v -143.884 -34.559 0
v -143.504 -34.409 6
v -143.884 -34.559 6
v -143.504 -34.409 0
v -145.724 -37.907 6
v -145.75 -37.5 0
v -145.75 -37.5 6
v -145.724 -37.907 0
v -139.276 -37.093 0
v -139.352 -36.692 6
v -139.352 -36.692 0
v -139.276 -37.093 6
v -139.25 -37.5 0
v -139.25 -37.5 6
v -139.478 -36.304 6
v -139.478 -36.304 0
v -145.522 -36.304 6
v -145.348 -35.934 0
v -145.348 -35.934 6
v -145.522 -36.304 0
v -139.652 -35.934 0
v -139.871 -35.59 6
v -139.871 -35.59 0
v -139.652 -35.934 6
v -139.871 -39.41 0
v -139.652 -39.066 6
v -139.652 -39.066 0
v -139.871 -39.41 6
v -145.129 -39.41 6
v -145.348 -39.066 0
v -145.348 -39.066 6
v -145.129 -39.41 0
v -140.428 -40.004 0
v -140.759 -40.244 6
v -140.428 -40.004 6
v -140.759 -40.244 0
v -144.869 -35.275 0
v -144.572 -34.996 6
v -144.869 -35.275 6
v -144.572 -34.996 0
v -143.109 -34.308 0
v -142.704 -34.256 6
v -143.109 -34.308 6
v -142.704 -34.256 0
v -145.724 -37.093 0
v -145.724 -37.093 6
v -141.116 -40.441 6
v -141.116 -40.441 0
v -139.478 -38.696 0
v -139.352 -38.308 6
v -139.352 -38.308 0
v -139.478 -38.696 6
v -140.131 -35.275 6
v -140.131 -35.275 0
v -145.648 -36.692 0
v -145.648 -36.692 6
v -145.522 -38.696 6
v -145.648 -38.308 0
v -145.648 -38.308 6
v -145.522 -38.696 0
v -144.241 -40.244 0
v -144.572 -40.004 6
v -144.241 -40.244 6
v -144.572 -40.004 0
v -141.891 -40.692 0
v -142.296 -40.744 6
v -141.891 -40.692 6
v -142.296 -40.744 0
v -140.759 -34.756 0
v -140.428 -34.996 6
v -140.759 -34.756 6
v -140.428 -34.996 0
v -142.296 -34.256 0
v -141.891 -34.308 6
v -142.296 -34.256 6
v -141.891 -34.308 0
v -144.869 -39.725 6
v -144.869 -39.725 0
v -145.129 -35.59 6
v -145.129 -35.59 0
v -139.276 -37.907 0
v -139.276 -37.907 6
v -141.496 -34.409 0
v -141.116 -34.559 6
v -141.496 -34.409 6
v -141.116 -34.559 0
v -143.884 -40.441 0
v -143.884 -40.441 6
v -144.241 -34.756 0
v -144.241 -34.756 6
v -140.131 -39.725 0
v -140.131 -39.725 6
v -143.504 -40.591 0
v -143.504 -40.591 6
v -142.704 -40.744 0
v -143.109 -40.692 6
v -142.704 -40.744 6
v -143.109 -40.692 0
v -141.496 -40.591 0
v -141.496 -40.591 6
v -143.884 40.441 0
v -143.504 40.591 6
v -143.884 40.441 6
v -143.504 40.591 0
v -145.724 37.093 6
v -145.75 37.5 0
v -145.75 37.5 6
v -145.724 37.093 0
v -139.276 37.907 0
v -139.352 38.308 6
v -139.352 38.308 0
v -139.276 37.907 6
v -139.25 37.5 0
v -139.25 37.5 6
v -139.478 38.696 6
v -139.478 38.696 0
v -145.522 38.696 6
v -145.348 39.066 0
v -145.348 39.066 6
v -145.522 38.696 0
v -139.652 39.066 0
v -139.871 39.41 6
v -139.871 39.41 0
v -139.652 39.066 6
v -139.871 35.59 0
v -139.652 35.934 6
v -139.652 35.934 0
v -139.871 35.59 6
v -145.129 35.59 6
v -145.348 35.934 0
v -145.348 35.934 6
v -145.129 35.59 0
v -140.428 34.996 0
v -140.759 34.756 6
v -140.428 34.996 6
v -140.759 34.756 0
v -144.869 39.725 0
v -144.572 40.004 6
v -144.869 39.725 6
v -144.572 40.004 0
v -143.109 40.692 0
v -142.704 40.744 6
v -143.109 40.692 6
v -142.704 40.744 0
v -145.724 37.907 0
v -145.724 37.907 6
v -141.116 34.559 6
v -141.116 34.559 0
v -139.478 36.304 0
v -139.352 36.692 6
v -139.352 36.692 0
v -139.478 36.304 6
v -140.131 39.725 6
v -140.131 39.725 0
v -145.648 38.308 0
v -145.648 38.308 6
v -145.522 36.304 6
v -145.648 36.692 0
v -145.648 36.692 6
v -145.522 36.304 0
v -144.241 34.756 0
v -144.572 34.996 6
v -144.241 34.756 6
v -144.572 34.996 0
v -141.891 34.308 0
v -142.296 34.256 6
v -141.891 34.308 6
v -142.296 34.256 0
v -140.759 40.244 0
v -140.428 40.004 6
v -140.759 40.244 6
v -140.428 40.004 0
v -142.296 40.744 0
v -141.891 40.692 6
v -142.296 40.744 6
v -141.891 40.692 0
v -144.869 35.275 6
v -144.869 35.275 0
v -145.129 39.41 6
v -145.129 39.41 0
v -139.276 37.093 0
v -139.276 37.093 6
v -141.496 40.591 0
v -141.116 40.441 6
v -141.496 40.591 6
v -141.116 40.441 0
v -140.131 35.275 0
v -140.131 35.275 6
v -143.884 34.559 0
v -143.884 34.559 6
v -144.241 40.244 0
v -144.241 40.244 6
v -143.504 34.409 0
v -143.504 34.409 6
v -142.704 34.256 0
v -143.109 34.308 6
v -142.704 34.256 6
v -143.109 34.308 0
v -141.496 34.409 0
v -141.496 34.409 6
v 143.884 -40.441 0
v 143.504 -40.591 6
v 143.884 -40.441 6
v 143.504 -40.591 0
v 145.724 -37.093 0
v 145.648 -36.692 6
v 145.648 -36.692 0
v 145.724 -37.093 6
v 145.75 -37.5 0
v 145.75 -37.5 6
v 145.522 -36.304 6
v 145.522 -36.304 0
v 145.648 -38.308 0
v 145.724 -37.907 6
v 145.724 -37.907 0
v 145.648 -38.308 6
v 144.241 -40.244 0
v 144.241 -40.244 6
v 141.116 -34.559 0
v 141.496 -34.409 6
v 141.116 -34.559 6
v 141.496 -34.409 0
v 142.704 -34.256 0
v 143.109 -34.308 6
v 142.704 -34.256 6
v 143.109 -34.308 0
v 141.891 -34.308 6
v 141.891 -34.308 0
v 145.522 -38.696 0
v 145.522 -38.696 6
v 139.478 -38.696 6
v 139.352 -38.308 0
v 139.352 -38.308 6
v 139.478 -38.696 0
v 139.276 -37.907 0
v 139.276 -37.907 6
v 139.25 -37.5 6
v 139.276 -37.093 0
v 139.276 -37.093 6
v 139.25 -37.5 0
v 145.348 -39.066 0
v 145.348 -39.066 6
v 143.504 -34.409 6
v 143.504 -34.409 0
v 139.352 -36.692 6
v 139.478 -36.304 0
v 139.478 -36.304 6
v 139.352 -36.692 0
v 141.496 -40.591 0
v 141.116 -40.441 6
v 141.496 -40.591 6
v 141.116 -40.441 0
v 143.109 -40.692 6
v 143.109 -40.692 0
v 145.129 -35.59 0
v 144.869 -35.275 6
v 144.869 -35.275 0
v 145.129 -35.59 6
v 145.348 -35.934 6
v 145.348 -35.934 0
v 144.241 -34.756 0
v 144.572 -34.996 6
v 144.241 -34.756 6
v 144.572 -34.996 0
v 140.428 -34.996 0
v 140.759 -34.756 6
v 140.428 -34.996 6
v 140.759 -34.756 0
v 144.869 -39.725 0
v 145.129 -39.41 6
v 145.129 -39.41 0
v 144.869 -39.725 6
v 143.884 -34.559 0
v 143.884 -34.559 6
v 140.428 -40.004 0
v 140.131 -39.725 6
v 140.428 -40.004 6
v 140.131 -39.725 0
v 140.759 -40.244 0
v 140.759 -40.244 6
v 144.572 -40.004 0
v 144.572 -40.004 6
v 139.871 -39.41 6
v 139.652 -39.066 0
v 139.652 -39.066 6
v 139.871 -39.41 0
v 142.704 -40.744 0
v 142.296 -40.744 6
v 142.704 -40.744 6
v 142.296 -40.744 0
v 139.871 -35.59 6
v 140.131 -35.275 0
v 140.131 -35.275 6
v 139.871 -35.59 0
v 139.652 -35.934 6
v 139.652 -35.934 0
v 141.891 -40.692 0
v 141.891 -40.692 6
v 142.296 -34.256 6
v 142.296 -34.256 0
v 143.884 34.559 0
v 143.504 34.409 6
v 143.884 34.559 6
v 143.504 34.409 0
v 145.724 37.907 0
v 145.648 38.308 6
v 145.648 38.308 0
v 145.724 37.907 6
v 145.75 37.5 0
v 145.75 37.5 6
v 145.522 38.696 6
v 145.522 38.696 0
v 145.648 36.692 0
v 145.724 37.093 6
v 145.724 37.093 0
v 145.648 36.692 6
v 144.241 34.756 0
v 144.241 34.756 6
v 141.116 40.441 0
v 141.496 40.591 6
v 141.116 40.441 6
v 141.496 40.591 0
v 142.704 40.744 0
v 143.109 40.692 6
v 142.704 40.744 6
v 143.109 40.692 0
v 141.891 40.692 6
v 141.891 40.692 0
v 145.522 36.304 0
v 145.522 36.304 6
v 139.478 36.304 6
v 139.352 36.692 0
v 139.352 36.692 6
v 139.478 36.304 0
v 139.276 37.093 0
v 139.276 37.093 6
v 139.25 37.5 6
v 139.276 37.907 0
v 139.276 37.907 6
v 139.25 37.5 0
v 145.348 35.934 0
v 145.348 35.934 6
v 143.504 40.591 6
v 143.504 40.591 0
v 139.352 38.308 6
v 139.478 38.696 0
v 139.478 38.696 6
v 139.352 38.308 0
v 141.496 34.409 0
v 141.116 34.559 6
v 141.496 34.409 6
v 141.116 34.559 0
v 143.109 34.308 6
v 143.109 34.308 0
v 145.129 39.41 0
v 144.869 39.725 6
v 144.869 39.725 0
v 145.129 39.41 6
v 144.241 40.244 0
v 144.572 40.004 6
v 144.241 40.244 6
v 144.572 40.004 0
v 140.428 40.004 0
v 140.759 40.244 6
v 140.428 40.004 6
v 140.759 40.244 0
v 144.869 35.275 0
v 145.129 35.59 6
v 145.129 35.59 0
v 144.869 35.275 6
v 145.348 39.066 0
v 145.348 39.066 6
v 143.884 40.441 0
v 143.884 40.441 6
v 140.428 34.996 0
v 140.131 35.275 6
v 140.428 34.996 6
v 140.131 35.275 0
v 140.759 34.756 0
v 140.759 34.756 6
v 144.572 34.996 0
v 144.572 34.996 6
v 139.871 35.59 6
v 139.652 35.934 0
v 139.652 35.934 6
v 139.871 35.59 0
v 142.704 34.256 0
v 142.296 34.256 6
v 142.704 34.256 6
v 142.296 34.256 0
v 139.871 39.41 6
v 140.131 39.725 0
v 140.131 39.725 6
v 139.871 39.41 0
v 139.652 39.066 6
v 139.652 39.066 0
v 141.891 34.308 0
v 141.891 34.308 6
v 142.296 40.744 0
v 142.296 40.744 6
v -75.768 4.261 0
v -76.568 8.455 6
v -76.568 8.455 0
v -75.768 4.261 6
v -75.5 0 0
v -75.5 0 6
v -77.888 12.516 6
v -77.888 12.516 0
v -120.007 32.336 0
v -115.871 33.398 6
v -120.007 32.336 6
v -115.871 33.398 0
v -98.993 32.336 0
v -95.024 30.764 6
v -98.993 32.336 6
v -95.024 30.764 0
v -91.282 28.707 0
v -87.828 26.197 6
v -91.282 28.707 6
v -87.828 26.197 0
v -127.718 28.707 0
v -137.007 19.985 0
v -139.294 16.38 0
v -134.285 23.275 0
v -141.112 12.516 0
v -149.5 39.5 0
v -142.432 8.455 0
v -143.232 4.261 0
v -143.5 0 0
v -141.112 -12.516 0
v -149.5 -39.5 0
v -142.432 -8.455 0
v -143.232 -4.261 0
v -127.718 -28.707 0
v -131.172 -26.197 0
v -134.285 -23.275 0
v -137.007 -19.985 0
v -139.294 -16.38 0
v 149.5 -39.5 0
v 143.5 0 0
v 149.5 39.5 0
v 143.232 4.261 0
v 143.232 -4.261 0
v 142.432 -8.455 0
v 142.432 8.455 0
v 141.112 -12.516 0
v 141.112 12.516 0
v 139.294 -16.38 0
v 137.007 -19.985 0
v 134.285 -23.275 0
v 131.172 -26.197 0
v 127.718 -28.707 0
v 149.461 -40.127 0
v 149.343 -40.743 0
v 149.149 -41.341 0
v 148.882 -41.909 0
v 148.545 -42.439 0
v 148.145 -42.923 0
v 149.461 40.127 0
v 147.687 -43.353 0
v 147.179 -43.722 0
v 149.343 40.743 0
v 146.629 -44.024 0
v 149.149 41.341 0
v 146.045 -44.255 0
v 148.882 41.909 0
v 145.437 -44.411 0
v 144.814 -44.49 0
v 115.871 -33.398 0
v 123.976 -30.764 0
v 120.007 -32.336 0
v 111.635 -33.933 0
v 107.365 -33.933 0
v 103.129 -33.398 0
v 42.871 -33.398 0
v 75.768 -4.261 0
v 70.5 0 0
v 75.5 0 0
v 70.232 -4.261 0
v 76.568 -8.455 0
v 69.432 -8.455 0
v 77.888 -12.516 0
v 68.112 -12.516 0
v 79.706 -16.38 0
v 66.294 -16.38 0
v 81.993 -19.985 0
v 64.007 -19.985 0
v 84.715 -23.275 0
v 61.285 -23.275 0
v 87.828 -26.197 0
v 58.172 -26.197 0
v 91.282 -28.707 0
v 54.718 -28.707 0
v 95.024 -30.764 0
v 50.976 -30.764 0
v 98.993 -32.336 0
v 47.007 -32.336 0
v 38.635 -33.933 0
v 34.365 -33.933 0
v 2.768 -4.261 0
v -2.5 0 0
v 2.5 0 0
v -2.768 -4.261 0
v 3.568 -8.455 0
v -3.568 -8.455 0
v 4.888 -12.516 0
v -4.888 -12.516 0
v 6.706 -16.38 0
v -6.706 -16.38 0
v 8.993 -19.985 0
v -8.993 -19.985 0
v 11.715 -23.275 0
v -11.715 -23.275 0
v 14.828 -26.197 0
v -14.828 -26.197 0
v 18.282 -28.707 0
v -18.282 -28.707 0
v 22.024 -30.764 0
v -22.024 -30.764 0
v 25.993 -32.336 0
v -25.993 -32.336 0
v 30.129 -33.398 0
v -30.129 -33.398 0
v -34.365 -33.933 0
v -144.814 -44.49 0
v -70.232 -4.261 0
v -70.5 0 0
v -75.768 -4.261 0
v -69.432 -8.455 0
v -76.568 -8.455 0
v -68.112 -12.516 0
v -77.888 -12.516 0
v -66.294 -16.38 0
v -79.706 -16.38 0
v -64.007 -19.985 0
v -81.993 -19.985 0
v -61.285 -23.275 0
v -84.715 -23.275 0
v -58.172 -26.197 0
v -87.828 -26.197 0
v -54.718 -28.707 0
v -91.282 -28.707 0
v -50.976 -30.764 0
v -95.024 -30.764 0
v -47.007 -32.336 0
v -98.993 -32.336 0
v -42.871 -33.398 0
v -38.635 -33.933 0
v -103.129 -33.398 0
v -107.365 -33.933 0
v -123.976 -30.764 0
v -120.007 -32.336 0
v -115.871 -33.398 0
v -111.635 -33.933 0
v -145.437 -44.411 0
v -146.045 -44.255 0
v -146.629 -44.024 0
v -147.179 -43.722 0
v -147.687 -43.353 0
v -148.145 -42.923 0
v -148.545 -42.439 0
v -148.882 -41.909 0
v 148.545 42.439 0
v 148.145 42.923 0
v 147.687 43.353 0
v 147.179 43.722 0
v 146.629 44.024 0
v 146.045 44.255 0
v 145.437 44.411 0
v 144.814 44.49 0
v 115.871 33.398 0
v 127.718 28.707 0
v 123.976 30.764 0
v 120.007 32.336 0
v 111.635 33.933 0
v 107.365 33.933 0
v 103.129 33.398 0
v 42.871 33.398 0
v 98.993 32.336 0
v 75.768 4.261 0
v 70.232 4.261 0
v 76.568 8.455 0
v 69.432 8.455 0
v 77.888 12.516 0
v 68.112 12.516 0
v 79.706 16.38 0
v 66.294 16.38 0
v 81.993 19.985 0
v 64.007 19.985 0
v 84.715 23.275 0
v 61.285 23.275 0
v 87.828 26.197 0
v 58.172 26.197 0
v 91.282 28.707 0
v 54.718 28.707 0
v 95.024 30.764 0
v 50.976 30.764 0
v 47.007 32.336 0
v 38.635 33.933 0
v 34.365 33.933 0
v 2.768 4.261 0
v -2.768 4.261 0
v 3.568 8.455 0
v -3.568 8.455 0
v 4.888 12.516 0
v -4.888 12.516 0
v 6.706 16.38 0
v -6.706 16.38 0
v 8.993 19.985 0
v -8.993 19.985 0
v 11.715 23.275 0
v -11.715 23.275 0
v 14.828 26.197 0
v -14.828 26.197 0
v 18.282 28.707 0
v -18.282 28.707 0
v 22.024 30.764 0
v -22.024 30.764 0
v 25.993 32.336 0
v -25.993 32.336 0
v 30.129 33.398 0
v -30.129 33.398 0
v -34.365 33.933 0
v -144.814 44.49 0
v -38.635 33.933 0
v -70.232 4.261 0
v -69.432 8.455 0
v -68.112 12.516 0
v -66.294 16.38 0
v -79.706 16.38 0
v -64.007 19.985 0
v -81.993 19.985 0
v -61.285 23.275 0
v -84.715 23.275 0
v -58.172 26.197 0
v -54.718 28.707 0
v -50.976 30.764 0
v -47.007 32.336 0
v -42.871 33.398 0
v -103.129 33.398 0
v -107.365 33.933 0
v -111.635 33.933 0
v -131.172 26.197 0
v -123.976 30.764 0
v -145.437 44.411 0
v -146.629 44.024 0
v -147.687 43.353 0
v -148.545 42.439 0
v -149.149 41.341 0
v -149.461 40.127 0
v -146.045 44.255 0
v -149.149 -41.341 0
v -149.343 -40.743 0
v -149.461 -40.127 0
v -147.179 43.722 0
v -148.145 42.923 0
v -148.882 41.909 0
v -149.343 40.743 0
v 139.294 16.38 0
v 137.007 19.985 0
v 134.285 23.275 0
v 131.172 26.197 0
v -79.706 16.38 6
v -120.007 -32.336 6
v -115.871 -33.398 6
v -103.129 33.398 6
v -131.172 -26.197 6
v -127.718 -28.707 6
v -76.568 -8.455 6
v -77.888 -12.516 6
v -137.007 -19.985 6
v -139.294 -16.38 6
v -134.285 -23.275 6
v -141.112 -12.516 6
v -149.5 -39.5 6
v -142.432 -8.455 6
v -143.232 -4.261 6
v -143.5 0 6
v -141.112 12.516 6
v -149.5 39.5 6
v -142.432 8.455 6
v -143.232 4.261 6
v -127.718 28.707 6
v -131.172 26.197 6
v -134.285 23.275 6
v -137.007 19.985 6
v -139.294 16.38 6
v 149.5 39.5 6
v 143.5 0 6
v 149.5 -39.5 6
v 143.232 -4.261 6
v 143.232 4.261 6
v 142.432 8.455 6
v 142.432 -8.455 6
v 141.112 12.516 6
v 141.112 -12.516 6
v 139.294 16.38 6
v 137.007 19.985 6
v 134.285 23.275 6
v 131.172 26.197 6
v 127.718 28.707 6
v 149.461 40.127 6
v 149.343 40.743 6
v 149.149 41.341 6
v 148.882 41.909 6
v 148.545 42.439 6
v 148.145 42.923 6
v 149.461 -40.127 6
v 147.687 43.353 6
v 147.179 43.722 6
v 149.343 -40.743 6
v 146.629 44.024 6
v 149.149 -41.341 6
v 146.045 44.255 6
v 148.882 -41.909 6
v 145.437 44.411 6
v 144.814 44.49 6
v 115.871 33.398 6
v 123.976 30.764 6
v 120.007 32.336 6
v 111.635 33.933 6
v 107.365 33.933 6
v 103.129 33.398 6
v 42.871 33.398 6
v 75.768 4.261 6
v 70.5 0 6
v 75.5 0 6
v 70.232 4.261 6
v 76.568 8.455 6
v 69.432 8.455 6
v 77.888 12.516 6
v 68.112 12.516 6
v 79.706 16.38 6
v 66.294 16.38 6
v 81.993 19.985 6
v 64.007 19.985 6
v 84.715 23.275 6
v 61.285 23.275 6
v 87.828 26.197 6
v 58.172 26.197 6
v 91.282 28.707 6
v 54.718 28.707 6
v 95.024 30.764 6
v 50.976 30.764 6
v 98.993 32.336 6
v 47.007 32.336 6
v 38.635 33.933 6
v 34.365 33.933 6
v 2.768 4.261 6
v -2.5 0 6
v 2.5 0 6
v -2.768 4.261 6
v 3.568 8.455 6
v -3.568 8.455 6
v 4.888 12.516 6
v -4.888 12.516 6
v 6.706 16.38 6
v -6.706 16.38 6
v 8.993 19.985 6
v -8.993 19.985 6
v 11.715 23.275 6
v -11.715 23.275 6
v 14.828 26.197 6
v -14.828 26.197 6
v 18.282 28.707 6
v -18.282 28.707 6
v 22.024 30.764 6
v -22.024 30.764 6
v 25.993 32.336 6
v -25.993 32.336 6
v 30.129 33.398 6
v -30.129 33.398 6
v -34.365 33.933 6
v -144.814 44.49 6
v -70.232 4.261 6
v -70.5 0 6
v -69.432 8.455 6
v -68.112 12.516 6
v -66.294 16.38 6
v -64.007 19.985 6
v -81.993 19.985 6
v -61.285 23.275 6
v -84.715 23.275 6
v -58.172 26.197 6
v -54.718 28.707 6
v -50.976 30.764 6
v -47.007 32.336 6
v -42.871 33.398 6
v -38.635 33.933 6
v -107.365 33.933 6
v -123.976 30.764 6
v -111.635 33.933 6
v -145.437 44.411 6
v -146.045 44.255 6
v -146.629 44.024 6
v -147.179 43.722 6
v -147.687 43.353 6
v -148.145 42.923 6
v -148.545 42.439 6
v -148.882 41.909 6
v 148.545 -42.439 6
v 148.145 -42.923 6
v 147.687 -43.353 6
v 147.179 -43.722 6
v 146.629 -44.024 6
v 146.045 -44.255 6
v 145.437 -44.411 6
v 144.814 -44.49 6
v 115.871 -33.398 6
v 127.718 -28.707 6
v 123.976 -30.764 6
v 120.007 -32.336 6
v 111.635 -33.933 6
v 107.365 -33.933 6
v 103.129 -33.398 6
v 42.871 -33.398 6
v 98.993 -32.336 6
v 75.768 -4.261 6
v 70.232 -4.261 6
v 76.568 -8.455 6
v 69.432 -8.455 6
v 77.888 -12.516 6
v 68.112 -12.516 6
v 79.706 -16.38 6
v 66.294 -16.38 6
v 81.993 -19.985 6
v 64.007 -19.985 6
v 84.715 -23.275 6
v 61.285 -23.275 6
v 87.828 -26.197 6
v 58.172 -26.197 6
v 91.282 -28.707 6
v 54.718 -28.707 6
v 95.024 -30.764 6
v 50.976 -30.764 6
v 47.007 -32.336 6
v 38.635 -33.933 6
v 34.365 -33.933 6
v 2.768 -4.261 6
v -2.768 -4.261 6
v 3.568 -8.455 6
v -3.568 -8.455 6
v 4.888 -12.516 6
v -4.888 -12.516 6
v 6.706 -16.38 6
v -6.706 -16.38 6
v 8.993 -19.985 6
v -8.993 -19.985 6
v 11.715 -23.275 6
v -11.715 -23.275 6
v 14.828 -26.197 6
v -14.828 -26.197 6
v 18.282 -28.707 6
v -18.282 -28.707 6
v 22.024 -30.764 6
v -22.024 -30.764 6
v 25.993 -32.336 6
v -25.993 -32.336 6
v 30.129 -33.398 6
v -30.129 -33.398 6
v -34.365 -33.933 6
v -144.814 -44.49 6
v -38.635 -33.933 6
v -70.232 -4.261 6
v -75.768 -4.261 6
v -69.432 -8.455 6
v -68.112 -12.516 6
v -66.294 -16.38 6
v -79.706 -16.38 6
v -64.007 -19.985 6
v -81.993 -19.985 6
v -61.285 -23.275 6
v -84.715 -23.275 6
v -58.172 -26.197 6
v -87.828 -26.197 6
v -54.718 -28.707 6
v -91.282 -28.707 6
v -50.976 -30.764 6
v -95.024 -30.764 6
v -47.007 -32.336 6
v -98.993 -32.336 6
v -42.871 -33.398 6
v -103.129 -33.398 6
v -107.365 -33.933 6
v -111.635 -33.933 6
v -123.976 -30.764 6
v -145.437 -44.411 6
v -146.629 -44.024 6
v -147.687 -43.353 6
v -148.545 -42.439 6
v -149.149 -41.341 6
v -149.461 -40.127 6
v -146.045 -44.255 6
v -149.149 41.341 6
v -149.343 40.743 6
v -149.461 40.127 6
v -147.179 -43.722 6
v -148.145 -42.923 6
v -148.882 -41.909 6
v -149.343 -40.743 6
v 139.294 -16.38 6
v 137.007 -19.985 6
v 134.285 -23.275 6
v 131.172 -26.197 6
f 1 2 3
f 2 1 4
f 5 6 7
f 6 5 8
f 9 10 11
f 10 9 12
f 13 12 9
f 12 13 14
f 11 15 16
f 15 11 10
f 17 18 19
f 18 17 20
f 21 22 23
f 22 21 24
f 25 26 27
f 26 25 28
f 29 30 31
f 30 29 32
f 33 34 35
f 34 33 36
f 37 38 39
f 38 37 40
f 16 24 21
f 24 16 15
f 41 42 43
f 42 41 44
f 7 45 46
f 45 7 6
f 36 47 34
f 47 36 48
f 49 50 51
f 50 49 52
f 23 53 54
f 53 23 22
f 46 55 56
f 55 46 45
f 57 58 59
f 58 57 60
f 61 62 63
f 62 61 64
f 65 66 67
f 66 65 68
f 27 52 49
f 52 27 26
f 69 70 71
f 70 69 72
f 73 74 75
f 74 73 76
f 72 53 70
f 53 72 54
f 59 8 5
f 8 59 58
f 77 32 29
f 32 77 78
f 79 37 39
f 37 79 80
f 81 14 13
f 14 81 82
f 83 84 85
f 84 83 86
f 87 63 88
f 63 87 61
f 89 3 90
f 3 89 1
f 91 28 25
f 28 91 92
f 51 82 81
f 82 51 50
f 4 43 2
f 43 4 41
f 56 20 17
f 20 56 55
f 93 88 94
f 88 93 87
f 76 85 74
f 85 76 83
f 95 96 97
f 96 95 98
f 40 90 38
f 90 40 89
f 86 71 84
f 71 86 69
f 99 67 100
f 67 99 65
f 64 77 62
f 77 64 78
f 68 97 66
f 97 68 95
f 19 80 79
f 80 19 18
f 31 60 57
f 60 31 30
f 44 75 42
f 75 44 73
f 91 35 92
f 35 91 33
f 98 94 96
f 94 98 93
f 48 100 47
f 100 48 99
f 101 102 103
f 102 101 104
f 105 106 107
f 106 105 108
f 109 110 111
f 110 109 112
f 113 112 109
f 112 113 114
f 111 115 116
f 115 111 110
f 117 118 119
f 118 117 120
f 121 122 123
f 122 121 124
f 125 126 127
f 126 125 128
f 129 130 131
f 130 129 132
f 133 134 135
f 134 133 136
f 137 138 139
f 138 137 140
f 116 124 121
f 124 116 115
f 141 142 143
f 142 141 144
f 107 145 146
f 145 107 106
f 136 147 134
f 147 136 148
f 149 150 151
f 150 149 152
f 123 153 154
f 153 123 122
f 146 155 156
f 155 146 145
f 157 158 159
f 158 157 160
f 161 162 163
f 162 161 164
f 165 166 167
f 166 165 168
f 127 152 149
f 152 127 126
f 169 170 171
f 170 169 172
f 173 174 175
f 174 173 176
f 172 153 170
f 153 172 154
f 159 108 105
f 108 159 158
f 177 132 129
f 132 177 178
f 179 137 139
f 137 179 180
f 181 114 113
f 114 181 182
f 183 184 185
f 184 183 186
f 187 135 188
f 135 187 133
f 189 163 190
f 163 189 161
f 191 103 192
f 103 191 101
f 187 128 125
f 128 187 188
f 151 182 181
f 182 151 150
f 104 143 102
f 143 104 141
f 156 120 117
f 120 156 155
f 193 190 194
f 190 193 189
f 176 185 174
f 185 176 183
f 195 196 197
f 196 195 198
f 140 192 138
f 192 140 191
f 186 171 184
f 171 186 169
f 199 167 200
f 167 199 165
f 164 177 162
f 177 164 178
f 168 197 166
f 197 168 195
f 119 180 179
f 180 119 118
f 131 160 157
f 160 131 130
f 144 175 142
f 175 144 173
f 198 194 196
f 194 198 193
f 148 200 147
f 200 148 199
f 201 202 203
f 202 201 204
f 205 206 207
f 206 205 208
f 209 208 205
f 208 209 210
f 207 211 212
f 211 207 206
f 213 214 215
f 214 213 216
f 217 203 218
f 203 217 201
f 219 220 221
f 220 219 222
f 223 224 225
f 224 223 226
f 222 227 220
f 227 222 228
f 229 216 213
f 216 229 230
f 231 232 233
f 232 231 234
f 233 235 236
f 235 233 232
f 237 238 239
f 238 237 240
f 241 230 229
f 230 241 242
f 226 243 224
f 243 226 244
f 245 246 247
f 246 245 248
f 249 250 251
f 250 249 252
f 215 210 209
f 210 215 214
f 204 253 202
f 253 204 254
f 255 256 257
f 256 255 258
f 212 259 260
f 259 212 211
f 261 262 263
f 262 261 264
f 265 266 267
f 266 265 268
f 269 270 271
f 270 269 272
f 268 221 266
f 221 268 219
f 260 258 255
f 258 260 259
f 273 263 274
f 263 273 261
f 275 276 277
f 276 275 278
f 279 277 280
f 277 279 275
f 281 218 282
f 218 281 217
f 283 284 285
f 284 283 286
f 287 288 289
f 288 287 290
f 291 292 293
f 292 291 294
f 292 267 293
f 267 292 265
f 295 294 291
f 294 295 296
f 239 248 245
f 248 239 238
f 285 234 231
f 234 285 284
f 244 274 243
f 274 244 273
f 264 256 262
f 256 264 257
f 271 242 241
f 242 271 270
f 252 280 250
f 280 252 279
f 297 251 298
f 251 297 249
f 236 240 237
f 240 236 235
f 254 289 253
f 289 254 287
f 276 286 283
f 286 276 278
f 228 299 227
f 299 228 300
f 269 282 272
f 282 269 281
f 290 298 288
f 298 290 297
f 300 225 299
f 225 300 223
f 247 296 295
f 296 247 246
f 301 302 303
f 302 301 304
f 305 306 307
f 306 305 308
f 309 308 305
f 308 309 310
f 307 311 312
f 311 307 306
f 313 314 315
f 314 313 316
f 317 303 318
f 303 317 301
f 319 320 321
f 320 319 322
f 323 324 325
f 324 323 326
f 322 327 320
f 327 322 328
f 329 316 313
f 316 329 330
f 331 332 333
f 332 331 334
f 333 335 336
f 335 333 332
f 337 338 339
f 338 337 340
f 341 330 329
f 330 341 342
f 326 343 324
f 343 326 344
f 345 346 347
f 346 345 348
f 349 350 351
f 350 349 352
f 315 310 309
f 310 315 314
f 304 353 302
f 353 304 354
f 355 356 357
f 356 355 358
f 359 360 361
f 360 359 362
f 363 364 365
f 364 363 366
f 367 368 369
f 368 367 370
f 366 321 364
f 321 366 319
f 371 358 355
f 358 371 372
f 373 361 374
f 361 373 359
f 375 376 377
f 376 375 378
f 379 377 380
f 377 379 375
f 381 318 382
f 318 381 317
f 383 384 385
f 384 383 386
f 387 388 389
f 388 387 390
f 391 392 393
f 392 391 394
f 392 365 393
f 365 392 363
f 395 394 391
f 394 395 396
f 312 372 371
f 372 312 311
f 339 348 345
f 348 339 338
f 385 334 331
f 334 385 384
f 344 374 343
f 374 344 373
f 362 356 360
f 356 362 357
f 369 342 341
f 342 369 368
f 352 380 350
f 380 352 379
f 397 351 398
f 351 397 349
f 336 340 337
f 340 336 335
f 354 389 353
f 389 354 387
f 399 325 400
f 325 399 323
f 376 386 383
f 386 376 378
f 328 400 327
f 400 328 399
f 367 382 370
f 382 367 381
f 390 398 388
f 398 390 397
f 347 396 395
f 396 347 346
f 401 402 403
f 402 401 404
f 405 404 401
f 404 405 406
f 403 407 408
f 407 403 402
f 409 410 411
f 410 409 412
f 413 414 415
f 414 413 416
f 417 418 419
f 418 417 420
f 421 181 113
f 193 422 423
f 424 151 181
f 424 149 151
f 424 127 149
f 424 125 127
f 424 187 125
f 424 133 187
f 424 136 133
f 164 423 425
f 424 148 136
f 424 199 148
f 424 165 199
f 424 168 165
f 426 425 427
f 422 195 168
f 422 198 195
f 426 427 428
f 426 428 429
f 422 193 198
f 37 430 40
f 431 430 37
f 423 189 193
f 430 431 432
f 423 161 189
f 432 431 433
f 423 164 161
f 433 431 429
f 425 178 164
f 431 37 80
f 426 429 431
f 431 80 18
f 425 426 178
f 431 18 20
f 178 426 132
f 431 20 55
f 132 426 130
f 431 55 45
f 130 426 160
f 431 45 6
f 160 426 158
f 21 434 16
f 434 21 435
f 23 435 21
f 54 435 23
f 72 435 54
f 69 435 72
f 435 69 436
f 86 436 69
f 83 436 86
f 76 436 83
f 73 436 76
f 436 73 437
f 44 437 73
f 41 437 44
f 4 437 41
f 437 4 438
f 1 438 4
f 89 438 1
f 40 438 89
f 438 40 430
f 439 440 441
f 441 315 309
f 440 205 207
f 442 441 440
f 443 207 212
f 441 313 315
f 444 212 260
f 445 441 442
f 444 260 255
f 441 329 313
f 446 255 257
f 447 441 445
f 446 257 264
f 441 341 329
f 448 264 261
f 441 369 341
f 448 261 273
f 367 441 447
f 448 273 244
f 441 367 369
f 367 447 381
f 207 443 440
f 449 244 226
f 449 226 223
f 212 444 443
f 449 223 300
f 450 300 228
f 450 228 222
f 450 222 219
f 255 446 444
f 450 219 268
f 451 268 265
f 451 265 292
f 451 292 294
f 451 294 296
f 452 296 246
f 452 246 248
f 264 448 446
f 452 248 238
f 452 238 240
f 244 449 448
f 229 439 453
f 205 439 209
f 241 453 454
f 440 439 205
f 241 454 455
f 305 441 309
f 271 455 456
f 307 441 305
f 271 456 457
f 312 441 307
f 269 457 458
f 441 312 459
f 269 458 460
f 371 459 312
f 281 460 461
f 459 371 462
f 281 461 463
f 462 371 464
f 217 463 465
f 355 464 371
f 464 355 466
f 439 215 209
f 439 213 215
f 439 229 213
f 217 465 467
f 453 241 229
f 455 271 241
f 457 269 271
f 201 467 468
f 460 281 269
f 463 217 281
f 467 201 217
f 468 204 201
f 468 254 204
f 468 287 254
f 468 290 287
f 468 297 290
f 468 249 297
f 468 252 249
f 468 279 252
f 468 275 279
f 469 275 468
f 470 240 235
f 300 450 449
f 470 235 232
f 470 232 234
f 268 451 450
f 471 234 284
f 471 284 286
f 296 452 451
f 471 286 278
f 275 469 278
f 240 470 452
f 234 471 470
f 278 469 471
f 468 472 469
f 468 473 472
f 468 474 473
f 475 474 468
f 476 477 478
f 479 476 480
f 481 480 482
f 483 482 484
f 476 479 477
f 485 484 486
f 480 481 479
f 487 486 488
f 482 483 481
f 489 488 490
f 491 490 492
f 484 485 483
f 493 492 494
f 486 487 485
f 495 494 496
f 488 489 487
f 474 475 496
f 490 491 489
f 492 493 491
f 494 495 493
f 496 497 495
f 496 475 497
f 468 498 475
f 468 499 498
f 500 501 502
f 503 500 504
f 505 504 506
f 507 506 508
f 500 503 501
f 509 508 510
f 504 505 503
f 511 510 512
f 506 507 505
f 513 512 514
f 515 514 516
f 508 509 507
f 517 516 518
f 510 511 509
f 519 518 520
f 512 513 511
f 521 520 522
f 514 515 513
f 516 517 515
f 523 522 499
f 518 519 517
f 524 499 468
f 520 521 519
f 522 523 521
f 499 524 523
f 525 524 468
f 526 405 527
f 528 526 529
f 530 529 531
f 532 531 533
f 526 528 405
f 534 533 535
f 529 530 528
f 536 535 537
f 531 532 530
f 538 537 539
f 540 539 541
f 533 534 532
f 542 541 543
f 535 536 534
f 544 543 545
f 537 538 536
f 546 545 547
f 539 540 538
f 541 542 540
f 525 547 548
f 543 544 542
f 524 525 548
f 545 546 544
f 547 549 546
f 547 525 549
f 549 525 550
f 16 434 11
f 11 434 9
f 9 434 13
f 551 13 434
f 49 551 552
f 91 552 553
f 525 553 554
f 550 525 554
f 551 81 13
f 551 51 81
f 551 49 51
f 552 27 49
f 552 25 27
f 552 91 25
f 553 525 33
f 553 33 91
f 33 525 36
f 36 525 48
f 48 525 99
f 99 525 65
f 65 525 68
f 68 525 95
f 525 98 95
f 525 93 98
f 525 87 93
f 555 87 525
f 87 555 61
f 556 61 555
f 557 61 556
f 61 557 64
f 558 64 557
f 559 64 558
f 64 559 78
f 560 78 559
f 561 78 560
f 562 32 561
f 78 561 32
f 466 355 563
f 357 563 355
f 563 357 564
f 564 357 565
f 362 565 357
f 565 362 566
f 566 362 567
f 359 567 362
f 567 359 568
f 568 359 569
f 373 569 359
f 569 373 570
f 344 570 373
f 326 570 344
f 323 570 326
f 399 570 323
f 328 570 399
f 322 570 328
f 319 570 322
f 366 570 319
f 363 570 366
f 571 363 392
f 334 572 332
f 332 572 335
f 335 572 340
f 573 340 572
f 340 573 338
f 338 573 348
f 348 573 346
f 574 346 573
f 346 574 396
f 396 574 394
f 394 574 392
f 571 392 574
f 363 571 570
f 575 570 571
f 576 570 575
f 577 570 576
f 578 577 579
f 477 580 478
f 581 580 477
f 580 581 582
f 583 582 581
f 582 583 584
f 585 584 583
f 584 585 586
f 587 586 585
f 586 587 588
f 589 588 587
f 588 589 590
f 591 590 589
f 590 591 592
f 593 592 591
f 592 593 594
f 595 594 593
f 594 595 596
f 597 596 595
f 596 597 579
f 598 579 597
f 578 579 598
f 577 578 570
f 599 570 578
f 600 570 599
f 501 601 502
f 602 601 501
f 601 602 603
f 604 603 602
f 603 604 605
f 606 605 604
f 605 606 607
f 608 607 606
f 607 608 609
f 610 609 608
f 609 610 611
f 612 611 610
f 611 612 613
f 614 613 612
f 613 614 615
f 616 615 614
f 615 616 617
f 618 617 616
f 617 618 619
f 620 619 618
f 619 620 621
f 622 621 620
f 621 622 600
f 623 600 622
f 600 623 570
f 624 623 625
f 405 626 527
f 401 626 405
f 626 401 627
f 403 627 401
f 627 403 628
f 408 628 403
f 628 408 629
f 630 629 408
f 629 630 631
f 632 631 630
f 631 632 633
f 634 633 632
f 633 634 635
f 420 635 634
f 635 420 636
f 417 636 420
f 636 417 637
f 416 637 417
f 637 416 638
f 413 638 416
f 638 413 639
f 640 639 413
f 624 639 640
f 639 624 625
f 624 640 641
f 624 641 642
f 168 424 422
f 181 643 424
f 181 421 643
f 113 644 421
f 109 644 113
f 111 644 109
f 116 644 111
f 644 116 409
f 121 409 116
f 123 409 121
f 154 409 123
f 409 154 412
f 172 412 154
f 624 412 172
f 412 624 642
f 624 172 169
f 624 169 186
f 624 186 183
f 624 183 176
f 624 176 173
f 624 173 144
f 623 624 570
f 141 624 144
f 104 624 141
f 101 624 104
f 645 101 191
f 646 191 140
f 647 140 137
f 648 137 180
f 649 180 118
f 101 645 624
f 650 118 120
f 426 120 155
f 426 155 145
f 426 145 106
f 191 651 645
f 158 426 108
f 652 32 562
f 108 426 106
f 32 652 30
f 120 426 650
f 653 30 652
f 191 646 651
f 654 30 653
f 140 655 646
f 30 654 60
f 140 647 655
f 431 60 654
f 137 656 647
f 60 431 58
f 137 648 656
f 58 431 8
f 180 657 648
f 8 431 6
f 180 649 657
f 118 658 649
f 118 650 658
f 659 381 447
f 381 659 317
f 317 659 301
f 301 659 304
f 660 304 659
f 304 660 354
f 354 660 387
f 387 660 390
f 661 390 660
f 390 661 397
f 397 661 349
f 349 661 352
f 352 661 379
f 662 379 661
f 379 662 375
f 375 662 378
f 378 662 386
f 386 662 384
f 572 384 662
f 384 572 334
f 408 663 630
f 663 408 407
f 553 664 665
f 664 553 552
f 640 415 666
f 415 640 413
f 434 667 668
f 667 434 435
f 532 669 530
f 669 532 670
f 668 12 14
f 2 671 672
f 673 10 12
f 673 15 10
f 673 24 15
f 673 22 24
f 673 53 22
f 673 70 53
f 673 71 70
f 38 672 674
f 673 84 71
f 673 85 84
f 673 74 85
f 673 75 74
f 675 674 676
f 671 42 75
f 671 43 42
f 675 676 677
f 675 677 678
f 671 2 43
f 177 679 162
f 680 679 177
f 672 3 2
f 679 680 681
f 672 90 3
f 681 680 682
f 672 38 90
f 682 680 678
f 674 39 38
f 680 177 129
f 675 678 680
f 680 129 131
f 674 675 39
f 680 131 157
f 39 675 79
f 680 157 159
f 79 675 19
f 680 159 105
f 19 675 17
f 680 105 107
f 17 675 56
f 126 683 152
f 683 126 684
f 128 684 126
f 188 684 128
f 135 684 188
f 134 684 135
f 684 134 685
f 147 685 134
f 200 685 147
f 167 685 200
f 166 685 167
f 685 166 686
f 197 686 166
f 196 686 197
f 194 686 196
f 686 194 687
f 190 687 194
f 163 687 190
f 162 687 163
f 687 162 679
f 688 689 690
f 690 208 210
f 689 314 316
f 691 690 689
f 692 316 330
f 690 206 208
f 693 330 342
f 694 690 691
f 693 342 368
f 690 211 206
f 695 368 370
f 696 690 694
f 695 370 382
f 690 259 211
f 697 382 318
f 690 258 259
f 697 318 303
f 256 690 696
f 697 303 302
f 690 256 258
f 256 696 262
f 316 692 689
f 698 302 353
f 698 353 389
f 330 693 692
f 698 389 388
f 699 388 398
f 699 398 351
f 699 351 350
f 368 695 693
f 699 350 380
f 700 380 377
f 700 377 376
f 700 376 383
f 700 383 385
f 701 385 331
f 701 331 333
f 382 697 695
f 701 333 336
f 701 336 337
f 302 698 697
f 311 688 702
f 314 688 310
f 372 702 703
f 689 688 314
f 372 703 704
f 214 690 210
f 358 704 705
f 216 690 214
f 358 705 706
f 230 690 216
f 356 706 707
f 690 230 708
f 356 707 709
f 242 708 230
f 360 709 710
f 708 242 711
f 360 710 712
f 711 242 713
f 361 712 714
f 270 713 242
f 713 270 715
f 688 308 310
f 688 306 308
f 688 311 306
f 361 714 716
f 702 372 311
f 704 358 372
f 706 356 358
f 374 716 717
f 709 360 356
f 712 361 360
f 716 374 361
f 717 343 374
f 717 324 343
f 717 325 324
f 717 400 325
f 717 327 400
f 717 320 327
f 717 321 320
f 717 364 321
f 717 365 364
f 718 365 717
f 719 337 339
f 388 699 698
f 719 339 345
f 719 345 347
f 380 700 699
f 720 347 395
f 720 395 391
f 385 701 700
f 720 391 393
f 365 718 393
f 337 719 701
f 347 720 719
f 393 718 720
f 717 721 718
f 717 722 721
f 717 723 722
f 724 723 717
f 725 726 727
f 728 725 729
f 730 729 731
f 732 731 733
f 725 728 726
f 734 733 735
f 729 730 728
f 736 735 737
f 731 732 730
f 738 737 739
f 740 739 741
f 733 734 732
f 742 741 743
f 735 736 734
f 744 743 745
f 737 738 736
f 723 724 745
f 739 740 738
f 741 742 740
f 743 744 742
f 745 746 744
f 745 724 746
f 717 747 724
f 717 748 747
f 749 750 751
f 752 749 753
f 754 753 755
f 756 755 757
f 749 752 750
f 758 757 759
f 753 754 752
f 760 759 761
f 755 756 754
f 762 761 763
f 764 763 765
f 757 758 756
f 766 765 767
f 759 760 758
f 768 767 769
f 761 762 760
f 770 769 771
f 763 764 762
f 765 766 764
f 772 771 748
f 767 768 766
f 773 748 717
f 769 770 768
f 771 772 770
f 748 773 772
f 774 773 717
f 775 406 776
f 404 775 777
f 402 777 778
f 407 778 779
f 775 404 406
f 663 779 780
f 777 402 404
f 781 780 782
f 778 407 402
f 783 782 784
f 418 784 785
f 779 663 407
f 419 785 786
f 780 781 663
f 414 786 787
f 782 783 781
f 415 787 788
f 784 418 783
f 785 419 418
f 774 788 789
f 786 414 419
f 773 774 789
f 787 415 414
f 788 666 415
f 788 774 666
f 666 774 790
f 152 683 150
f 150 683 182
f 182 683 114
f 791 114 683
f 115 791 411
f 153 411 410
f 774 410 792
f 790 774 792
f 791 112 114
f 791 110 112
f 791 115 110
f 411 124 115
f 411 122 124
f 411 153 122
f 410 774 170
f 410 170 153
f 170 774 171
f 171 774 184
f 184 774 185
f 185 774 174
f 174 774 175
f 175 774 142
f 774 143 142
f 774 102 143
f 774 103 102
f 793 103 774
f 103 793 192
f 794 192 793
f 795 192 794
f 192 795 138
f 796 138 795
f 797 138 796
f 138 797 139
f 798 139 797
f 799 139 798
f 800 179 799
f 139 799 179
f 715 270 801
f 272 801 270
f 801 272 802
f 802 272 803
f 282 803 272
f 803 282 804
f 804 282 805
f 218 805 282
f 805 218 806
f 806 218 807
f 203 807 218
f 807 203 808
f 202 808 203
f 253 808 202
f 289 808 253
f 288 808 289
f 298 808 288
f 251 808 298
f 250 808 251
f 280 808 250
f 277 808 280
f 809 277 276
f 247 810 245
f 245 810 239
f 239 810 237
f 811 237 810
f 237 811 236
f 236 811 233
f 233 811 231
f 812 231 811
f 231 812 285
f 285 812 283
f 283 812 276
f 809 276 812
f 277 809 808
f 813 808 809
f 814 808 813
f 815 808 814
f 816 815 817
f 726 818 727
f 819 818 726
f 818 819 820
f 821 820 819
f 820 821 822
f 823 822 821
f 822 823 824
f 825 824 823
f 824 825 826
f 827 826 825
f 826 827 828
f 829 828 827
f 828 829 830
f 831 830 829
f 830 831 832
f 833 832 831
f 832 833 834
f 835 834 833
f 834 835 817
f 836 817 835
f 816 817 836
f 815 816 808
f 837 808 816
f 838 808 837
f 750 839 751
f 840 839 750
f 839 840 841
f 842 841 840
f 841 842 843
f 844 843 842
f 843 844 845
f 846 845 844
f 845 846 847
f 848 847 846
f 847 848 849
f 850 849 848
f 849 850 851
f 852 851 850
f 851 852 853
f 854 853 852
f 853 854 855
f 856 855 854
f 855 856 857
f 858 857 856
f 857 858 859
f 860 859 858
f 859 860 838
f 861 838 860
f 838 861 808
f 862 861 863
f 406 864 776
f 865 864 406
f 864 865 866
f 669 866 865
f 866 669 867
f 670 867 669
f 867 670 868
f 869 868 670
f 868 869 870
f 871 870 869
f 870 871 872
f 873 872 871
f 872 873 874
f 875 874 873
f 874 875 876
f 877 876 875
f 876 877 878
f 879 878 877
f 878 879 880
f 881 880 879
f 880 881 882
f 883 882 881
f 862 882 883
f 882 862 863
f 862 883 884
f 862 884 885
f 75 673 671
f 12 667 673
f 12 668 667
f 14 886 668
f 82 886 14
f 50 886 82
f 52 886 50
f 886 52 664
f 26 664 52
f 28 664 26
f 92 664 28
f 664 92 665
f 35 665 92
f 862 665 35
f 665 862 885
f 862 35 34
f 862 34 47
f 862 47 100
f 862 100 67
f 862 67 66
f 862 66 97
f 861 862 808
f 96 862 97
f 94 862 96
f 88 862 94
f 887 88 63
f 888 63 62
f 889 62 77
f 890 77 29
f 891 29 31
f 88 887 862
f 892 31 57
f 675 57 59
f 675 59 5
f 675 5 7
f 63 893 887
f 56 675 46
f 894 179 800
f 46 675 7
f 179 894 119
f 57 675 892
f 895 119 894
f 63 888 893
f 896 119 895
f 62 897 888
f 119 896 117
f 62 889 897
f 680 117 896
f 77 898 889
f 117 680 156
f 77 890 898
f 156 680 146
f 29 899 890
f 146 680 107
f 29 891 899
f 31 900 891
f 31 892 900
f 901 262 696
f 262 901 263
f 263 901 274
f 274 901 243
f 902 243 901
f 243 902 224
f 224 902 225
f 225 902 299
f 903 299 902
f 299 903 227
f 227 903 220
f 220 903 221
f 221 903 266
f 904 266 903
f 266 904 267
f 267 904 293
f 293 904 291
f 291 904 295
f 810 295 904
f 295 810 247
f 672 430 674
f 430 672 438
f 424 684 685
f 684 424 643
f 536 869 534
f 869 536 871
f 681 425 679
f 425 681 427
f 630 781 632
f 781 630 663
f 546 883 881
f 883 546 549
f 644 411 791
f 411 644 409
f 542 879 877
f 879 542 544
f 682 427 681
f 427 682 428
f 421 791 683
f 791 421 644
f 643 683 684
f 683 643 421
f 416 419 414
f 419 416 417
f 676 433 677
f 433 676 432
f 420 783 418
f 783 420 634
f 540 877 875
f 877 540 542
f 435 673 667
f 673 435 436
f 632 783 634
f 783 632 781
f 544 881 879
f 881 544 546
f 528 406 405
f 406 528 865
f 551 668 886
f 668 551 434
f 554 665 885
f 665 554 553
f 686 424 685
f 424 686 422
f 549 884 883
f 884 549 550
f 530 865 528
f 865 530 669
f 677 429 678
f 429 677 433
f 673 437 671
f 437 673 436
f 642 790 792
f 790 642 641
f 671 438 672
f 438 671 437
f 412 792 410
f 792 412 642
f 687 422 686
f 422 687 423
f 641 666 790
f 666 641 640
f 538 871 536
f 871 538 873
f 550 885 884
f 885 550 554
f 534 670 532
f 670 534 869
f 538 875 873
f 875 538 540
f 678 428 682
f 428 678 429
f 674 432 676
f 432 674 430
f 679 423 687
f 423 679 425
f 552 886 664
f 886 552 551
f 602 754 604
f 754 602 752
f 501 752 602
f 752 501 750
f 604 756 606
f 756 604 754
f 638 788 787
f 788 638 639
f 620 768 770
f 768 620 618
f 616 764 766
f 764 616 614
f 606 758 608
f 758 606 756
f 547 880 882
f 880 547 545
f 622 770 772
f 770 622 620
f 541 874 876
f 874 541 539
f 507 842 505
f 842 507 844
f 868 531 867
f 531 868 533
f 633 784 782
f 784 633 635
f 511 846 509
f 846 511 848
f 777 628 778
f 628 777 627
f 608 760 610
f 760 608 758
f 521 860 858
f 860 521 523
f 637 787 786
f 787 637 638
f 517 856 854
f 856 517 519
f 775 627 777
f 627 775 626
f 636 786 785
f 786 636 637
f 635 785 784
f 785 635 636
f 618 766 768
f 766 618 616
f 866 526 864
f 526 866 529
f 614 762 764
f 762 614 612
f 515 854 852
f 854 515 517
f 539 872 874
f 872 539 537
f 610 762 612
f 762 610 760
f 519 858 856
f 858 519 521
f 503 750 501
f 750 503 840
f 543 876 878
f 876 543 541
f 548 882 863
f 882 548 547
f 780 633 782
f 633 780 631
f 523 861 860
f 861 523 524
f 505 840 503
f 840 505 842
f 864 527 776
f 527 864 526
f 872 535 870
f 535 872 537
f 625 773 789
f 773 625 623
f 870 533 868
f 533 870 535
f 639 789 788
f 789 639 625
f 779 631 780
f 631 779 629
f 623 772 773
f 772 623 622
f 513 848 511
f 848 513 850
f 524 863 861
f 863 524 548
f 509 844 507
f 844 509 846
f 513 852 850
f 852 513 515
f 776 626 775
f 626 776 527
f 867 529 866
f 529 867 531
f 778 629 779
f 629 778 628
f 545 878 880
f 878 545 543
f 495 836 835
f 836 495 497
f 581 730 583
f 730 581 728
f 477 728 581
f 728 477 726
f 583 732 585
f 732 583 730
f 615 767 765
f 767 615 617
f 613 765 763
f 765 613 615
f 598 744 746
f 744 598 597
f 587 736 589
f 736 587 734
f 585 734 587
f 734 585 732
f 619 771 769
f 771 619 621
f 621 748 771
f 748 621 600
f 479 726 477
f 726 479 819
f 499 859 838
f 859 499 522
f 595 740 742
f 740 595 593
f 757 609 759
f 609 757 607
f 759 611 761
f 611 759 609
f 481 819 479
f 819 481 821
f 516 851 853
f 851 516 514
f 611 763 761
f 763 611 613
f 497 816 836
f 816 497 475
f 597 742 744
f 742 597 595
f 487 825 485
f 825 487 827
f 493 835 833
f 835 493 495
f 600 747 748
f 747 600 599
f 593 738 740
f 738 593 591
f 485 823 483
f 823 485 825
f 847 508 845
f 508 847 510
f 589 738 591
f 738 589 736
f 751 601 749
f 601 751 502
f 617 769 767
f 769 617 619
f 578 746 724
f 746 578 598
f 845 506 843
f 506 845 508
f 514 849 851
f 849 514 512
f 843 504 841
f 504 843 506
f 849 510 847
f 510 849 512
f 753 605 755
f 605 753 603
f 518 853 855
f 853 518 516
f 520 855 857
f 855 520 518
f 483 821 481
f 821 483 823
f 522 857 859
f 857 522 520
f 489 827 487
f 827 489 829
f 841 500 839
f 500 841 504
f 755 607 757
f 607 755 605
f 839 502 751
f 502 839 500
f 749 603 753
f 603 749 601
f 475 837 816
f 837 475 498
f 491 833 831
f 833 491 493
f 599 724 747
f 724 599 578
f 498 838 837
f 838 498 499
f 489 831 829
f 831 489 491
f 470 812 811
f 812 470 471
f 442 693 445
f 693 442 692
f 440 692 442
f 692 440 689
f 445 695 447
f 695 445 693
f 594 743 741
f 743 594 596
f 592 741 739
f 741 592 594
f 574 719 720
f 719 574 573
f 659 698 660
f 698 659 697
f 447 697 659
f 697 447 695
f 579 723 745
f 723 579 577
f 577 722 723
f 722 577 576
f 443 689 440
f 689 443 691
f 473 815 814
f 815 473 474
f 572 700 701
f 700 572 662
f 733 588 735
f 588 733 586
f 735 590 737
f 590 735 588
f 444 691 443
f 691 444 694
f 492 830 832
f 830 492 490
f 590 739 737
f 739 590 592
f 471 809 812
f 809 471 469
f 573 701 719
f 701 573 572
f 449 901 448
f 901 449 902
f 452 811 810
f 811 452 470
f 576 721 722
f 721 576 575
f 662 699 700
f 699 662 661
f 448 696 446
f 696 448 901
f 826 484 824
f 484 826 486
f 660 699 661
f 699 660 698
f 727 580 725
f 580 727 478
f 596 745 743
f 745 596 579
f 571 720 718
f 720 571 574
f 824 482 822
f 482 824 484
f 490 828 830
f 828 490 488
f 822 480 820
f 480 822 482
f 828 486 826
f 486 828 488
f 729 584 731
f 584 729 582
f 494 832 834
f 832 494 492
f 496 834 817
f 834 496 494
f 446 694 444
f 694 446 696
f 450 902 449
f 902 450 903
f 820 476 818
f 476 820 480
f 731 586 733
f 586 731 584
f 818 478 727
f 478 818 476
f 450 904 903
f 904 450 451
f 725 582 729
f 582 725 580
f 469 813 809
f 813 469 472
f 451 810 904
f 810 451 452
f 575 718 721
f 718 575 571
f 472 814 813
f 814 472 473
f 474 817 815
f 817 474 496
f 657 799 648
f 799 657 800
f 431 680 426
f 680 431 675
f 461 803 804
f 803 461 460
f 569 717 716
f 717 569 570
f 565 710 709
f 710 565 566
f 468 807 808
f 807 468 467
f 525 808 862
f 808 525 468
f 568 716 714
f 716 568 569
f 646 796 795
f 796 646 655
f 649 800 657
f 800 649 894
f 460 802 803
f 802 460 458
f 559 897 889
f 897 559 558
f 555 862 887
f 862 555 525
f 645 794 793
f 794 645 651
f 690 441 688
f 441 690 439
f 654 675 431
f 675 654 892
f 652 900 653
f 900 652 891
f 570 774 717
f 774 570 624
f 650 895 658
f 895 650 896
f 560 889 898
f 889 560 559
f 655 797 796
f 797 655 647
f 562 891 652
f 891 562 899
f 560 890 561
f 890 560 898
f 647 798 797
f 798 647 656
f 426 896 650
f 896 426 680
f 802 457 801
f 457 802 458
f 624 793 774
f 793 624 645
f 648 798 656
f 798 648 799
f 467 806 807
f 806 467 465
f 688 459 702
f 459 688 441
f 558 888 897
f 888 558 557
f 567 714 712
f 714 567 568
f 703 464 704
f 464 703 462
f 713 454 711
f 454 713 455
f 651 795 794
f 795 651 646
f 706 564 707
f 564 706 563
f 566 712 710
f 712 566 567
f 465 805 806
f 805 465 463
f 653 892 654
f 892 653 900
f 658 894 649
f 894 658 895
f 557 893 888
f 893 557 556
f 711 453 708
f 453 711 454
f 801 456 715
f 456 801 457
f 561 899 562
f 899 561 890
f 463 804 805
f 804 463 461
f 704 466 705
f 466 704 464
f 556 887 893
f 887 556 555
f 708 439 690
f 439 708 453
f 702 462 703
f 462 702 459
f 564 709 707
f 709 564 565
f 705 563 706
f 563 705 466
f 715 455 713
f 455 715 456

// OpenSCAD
$fn = 50;


difference() {
	union() {
		hull() {
			translate(v = [-144.5000000000, 39.5000000000, 0]) {
				cylinder(h = 6, r = 5);
			}
			translate(v = [144.5000000000, 39.5000000000, 0]) {
				cylinder(h = 6, r = 5);
			}
			translate(v = [-144.5000000000, -39.5000000000, 0]) {
				cylinder(h = 6, r = 5);
			}
			translate(v = [144.5000000000, -39.5000000000, 0]) {
				cylinder(h = 6, r = 5);
			}
		}
	}
	union() {
		#translate(v = [-142.5000000000, -37.5000000000, -100.0000000000]) {
			cylinder(h = 200, r = 3.2500000000);
		}
		#translate(v = [-142.5000000000, 37.5000000000, -100.0000000000]) {
			cylinder(h = 200, r = 3.2500000000);
		}
		#translate(v = [142.5000000000, -37.5000000000, -100.0000000000]) {
			cylinder(h = 200, r = 3.2500000000);
		}
		#translate(v = [142.5000000000, 37.5000000000, -100.0000000000]) {
			cylinder(h = 200, r = 3.2500000000);
		}
		#translate(v = [-109.5000000000, 0, 0]) {
			cylinder(h = 6, r = 34.0000000000);
		}
		#translate(v = [-36.5000000000, 0, 0]) {
			cylinder(h = 6, r = 34.0000000000);
		}
		#translate(v = [36.5000000000, 0, 0]) {
			cylinder(h = 6, r = 34.0000000000);
		}
		#translate(v = [109.5000000000, 0, 0]) {
			cylinder(h = 6, r = 34.0000000000);
		}
	}
}
